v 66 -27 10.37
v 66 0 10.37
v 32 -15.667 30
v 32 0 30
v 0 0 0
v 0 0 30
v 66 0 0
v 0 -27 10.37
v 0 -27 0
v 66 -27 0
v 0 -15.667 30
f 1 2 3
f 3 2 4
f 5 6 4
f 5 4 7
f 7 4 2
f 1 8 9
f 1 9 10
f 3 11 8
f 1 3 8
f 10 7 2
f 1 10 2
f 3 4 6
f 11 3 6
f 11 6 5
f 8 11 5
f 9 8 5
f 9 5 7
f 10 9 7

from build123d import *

# Parameters (mm, degrees)
F1_DEPTH = 27
F3_DEPTH = 66.001


with BuildPart() as f1:
    # F0 (on Front) → F1 (new body)
    with BuildSketch(Plane.XZ):
        Polygon((0, 30), (0, 0), (66, 0), (66, 10.370091), (32, 30), align=None)
    extrude(amount=F1_DEPTH)

    # F2 (on face) → F3 (cut, through all)
    with BuildSketch(Plane(origin=(0, 0, 0), x_dir=(0, -1, 0), z_dir=(-1, 0, 0))):
        Polygon((15.666667, 30), (27, 10.370091), (27, 30), align=None)
    extrude(amount=-F3_DEPTH, mode=Mode.SUBTRACT)


solid = f1.part
